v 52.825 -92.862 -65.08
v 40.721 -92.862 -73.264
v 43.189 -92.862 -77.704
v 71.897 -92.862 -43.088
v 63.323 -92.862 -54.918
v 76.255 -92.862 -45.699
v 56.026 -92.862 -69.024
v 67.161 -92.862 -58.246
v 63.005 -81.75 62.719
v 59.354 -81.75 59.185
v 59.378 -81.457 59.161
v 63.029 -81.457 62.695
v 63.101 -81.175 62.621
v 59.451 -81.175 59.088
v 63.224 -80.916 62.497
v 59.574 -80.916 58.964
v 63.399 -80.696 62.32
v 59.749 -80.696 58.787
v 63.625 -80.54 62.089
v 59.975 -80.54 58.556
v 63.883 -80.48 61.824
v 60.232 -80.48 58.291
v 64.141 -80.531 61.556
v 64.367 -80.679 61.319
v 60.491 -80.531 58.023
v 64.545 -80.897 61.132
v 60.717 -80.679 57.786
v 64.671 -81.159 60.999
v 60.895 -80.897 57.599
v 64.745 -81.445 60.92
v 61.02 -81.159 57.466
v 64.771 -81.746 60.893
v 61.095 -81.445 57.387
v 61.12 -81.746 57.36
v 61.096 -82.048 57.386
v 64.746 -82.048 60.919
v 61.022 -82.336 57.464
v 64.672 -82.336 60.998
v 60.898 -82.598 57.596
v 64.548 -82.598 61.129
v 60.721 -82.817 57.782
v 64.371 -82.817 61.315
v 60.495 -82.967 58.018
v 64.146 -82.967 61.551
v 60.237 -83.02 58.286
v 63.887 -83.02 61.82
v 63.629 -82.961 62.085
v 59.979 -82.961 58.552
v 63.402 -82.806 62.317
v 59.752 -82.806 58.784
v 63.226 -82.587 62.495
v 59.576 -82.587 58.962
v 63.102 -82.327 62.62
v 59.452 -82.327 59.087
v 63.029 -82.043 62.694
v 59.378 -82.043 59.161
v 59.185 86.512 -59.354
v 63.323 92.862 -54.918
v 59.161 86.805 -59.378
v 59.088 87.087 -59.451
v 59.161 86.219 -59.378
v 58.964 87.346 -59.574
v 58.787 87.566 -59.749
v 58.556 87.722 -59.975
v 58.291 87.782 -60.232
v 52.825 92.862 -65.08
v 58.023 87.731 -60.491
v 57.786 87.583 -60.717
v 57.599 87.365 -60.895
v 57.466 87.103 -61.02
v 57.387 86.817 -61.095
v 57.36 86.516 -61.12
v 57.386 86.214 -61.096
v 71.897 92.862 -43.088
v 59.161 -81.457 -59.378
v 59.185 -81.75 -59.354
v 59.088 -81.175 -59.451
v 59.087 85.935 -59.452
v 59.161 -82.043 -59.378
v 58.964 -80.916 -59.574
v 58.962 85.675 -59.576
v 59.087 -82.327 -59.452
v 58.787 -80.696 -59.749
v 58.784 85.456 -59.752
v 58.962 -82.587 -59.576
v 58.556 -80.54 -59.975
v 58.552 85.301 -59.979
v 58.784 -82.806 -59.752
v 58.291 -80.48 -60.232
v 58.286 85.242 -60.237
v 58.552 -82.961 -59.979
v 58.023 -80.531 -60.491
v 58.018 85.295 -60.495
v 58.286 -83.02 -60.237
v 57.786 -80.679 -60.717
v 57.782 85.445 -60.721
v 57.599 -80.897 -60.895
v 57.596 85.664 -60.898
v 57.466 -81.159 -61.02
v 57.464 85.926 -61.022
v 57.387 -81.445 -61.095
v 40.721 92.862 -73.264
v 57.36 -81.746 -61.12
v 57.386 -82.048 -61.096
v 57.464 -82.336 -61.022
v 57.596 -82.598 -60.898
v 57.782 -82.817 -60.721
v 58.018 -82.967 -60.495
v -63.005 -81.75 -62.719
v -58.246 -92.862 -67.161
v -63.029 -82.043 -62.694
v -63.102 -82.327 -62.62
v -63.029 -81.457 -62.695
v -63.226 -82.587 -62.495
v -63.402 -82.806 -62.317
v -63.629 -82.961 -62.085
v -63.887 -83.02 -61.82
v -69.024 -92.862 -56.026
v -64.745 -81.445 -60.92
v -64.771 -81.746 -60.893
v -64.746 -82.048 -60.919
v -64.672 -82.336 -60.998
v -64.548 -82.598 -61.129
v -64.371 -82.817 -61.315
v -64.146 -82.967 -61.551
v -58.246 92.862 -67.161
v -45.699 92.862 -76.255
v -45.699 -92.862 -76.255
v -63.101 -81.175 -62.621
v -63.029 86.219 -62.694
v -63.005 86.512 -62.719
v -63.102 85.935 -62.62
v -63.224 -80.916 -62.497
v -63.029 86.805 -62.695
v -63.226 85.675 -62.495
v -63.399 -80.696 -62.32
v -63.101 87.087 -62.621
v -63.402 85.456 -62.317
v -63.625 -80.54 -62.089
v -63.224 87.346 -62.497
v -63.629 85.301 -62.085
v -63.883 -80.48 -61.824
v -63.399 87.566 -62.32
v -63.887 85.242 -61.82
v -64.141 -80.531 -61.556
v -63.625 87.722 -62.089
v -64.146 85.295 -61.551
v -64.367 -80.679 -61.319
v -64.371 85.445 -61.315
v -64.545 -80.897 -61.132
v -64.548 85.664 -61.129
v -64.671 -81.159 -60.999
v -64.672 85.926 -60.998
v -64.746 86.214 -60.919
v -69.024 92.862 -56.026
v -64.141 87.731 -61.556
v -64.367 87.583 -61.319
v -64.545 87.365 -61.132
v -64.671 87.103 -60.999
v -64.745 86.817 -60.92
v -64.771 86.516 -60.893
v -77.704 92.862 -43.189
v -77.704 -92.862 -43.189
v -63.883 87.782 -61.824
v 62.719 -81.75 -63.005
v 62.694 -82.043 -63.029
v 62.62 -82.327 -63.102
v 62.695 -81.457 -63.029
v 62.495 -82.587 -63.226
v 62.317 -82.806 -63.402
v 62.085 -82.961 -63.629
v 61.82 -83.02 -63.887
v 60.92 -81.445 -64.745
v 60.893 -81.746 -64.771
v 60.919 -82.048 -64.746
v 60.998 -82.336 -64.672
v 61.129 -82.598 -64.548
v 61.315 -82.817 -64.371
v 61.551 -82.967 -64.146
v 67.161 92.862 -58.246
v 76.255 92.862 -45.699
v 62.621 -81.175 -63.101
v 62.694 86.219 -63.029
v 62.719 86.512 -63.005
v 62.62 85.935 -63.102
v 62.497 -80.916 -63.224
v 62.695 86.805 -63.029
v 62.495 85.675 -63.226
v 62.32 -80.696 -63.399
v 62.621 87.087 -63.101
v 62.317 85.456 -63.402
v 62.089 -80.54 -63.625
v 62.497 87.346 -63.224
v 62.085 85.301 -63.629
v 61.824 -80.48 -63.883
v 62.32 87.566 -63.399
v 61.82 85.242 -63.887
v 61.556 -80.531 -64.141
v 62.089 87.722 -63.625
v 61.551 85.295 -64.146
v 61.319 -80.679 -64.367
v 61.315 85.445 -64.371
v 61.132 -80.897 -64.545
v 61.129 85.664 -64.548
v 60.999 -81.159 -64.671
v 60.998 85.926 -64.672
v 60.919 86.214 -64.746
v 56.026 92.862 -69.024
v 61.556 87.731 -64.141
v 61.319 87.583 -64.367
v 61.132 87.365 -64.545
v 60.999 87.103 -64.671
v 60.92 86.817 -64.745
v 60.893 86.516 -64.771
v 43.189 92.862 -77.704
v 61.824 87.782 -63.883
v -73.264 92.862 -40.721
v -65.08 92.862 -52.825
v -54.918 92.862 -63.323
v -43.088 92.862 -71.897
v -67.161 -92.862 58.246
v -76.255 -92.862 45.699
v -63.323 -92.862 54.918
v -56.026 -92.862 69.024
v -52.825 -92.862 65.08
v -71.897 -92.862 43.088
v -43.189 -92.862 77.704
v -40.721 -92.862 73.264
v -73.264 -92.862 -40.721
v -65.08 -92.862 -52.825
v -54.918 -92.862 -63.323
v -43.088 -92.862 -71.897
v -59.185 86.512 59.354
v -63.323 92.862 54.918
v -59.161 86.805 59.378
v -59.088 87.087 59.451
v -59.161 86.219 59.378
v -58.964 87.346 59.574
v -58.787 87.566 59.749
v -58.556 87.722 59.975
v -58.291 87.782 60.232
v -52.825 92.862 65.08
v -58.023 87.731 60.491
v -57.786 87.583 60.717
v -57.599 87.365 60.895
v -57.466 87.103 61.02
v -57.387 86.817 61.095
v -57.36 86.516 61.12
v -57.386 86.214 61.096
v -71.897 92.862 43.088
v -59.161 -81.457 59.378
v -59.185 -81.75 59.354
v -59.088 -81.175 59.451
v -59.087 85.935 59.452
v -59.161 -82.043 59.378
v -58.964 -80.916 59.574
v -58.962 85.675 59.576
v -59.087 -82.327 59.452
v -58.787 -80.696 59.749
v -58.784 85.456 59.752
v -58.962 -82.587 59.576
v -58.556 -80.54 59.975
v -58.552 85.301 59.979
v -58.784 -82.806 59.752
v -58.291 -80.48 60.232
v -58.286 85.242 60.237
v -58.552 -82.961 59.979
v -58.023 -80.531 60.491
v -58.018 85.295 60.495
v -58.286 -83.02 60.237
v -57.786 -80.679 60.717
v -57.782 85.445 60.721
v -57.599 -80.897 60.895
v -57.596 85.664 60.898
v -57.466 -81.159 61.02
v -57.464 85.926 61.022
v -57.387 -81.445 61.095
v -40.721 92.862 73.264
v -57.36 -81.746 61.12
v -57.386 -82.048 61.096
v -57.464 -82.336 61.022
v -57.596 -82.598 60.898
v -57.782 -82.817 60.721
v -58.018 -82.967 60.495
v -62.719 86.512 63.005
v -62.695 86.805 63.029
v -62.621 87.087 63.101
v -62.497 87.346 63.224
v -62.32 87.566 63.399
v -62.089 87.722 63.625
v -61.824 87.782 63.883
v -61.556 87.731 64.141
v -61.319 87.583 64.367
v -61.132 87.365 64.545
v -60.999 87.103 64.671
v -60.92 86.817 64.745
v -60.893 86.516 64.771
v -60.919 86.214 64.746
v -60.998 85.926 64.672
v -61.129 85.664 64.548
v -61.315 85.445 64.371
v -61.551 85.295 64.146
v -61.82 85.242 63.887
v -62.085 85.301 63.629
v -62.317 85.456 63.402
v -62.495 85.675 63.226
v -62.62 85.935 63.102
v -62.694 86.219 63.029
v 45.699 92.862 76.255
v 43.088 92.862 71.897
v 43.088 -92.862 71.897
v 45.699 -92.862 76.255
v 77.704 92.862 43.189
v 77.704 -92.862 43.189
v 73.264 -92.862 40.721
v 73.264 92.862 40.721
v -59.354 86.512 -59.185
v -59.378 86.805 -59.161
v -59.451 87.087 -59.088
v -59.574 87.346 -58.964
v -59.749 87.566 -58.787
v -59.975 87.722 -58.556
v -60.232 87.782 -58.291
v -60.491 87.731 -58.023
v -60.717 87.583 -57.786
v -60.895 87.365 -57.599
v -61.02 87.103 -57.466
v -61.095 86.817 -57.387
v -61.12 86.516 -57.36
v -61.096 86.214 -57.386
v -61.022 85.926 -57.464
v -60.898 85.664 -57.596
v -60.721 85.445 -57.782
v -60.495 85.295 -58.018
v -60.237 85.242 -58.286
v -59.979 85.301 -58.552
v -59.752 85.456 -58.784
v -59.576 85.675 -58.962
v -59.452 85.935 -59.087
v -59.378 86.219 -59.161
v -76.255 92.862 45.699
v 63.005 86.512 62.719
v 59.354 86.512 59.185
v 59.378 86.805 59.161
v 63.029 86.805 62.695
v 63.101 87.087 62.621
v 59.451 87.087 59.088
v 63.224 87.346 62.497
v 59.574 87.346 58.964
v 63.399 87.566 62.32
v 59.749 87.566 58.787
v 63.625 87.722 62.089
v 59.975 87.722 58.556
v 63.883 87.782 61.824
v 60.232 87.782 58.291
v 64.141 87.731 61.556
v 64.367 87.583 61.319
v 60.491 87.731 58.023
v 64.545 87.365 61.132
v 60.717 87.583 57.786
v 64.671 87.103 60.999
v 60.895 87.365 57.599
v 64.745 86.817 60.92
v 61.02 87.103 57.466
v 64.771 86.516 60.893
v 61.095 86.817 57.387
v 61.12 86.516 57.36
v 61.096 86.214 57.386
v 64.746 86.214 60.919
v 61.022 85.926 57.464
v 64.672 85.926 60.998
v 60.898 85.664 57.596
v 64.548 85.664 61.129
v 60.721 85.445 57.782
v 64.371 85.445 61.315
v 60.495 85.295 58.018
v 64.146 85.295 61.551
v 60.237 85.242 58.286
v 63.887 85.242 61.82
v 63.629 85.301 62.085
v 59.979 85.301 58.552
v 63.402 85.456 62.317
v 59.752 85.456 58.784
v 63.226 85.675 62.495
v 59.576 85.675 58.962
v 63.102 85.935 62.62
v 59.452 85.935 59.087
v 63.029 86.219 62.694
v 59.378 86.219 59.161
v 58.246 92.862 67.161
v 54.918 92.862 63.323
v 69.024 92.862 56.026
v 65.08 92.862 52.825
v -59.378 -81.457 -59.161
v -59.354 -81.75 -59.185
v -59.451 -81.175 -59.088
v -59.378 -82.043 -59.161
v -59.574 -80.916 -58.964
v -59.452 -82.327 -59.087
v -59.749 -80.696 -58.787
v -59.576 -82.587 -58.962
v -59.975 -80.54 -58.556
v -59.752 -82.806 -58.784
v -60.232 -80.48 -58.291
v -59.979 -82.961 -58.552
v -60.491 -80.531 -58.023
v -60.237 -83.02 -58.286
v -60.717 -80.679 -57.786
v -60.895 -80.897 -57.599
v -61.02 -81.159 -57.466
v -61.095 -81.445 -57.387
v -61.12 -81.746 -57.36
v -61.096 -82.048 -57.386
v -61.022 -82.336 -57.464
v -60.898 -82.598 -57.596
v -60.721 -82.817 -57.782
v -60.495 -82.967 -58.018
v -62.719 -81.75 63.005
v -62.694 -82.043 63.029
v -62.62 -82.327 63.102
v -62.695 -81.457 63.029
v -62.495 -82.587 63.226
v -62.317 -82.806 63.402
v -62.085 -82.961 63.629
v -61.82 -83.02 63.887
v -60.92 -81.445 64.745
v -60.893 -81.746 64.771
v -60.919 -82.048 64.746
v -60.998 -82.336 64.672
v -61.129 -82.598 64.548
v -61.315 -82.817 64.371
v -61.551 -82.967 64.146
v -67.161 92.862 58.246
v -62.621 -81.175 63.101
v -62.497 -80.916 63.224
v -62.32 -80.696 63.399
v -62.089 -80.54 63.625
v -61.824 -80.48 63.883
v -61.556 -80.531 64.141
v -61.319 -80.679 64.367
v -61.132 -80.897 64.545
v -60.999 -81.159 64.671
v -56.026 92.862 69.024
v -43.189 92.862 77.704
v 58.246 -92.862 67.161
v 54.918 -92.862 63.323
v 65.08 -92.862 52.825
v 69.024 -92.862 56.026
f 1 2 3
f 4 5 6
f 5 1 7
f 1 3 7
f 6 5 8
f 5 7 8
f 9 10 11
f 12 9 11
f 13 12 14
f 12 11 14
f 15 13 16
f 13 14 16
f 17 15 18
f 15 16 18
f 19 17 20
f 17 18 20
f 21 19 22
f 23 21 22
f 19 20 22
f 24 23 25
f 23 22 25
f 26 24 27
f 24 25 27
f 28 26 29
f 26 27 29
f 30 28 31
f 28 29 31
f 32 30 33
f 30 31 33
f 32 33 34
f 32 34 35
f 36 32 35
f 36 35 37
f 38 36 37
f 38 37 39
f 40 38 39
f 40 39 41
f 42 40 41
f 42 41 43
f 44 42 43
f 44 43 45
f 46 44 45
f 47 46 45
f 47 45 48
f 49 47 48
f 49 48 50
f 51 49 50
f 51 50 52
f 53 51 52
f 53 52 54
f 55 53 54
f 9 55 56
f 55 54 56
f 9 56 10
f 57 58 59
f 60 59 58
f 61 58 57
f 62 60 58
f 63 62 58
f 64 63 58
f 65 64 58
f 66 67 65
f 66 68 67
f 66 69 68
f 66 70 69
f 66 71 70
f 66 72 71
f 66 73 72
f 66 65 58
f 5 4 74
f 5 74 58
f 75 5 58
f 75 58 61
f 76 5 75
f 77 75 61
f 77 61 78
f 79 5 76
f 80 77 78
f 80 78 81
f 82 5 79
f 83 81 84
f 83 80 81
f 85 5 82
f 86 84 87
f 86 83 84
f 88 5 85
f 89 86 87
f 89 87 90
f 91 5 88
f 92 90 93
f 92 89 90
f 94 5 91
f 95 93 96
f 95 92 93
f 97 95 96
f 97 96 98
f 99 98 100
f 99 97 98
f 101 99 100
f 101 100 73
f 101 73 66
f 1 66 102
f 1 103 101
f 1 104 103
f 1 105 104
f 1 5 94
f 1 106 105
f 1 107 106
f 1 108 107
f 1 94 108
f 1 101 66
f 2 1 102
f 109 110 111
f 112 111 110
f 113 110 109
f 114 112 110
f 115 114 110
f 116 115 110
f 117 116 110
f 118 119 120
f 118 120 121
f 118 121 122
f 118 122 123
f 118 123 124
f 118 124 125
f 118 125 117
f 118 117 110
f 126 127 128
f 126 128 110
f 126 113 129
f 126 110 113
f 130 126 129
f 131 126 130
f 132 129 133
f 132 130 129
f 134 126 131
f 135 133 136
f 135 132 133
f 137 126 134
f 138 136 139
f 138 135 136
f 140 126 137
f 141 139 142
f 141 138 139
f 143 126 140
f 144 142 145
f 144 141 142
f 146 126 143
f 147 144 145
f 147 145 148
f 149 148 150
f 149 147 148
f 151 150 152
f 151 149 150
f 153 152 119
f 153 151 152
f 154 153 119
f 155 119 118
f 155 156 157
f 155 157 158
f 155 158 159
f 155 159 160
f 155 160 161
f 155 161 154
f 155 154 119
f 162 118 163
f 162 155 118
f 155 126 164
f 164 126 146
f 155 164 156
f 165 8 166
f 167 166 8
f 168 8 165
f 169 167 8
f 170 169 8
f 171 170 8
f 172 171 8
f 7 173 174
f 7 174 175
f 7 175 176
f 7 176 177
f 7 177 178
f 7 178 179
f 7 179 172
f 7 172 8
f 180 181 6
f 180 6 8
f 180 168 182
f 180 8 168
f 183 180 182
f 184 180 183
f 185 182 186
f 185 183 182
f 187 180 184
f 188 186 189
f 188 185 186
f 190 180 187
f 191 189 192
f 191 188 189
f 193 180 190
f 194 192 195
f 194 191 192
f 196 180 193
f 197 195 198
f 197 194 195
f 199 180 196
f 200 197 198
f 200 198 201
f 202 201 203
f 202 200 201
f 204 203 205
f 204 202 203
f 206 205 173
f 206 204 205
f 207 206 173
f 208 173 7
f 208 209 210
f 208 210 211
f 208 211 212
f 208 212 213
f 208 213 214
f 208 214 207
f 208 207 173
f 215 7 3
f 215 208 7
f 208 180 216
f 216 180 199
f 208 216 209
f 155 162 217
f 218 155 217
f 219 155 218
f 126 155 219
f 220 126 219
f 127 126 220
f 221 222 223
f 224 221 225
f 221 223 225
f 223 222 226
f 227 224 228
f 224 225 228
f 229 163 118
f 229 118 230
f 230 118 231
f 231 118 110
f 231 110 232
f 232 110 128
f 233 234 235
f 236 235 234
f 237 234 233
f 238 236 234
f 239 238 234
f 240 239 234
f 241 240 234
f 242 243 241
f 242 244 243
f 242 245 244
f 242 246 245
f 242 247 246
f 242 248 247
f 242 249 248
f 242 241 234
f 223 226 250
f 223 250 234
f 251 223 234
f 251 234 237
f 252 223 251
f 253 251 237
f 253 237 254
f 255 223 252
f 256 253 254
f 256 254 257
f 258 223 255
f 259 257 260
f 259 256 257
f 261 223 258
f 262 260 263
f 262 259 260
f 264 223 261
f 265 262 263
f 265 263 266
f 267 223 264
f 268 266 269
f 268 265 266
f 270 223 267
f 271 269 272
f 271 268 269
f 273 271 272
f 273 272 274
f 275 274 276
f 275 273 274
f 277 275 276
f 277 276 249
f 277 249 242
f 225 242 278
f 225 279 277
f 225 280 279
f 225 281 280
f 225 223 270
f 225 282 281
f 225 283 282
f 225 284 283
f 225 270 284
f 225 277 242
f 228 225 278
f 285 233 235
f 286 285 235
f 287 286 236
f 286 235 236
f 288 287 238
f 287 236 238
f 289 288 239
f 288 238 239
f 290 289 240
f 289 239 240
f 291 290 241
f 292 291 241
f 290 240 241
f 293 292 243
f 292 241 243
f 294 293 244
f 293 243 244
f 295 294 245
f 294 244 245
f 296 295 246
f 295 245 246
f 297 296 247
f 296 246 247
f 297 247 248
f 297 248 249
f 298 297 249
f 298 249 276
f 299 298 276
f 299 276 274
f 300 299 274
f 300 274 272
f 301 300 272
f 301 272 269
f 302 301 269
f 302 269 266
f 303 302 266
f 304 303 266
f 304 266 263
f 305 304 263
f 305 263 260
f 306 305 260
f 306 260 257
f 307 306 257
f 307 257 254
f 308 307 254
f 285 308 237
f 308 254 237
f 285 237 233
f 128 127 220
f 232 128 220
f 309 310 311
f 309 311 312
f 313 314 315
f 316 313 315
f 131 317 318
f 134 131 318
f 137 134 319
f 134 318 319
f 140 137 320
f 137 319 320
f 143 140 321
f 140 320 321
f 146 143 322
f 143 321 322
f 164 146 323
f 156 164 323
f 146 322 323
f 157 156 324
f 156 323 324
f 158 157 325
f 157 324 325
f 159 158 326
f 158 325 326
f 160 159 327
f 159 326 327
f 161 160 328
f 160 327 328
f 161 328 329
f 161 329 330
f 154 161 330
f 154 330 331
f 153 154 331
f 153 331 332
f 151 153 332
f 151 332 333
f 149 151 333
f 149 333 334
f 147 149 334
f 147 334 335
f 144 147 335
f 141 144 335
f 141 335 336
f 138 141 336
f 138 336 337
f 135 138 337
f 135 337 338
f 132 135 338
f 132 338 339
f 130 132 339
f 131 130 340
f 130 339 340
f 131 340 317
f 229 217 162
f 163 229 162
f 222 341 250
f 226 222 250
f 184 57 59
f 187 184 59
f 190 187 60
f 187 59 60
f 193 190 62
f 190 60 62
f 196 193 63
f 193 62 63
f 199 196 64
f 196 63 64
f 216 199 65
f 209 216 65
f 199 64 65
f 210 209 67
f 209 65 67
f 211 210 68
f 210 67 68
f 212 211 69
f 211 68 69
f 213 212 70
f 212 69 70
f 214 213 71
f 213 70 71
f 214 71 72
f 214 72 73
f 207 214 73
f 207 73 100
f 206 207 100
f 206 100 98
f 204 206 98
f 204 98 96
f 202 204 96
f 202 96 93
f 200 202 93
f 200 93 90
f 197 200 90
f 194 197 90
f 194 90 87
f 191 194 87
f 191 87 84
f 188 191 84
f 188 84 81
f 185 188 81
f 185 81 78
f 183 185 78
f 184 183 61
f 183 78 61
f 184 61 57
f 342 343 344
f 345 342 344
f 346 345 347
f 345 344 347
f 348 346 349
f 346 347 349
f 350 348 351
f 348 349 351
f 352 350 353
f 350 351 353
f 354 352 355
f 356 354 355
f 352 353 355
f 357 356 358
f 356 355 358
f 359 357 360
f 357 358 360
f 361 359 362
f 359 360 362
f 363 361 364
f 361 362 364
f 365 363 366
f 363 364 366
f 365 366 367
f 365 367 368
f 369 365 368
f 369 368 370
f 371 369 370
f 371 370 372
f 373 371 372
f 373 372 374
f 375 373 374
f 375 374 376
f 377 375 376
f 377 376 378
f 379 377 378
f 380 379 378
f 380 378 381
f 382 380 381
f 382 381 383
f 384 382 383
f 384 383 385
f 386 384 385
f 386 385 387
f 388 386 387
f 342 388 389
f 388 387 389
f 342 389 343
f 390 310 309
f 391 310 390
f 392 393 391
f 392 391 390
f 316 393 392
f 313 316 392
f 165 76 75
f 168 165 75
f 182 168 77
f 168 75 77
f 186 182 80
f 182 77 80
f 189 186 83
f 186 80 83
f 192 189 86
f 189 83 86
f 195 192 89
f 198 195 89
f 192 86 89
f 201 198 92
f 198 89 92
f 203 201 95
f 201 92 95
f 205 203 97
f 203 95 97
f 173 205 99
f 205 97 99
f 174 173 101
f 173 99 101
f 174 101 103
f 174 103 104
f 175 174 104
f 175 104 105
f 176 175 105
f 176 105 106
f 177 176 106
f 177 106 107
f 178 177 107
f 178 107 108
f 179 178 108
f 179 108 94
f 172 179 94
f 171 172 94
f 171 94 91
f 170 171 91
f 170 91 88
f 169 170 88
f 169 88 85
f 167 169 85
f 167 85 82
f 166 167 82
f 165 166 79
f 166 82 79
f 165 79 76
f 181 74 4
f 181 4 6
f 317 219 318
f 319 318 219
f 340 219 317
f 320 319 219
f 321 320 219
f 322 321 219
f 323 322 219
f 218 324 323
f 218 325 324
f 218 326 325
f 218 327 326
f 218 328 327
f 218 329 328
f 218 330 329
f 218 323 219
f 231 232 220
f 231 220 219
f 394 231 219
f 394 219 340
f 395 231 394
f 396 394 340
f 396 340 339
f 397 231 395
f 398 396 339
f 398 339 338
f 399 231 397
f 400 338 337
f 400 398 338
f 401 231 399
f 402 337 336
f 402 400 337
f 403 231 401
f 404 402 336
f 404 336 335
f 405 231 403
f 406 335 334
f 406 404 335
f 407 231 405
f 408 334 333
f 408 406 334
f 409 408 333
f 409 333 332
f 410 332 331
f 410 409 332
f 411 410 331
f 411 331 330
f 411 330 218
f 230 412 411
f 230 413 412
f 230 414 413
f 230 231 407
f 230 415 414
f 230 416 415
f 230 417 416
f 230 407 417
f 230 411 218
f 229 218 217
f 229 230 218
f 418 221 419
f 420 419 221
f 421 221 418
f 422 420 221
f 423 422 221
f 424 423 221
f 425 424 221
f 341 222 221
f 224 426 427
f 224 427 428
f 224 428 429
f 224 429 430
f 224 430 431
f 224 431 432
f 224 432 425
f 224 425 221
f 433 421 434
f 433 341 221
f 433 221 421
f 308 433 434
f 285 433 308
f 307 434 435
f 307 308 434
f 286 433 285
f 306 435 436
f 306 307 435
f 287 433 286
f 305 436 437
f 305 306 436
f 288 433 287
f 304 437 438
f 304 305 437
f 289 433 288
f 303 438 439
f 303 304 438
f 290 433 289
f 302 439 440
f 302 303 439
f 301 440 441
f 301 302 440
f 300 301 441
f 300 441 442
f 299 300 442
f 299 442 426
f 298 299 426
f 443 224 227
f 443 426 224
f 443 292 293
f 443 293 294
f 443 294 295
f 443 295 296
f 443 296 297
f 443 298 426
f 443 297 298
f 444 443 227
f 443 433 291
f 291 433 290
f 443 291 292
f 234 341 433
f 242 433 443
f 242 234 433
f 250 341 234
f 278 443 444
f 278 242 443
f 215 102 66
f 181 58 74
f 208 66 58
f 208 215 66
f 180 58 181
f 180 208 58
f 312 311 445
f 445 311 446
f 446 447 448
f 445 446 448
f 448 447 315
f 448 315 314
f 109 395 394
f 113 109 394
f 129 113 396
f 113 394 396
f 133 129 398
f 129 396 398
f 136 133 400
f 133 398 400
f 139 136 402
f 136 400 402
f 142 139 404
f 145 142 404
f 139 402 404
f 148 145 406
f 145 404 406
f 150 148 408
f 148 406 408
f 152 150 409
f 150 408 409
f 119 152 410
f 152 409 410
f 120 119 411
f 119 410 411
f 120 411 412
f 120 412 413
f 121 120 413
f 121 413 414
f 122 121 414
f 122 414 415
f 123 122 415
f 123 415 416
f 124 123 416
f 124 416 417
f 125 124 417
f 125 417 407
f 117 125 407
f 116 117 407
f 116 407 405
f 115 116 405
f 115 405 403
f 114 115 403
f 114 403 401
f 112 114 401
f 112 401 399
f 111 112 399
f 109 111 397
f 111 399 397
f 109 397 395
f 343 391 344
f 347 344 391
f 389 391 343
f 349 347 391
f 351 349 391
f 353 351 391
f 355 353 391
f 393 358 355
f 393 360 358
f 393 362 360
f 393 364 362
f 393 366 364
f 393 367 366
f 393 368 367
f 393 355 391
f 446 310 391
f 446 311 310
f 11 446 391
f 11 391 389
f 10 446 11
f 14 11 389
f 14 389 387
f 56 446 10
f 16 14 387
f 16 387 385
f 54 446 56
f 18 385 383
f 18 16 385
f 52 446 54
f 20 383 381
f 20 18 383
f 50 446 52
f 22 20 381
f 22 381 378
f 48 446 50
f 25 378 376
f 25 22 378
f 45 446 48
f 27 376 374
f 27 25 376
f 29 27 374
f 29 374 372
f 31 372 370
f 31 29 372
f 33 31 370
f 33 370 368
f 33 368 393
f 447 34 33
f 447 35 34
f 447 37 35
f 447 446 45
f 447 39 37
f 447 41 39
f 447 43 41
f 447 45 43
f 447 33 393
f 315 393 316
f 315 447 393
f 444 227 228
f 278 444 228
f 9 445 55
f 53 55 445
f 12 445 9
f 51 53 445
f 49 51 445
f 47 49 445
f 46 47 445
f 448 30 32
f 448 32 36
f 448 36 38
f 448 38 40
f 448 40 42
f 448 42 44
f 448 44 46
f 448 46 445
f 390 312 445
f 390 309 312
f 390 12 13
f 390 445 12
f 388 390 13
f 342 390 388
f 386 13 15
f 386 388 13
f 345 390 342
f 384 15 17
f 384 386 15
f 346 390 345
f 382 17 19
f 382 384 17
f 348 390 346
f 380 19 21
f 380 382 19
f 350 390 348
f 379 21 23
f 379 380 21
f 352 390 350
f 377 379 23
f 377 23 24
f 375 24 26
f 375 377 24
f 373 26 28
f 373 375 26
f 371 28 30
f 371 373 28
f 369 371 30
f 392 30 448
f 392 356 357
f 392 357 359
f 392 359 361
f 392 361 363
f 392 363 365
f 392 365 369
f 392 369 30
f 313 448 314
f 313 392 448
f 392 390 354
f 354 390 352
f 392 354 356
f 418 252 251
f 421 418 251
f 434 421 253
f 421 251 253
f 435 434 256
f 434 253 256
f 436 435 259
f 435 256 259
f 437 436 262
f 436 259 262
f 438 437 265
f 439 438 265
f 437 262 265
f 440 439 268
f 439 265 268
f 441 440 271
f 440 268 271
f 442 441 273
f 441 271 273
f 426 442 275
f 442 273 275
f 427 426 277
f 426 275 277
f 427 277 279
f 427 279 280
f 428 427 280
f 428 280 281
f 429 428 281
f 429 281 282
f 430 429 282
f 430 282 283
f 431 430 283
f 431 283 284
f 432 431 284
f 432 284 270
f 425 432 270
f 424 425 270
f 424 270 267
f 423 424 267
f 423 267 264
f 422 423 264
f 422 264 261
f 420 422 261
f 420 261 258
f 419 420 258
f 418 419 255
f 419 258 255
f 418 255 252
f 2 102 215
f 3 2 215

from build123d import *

# Parameters (mm, degrees)
SKETCH2_R               = 88.9
SKETCH2_R_2             = 83.82
BOSS_EXTRUDE1_DEPTH     = 92.862273
CUT_EXTRUDE1_DEPTH      = 93.862273
CUT_EXTRUDE1_DEPTH_BACK = 93.862273
SKETCH5_R               = 1.27
BOLT_HOLES_DEPTH        = 29.911624556
BOLT_PATTERN_COUNT      = 4


with BuildPart() as part:
    # Sketch2 → Boss-Extrude1 (new body, symmetric)
    with BuildSketch(Plane(origin=(0, 0, 0), x_dir=(1, 0, 0), z_dir=(0, 1, 0))):
        Circle(SKETCH2_R)
        Circle(SKETCH2_R_2, mode=Mode.SUBTRACT)
    extrude(amount=BOSS_EXTRUDE1_DEPTH, both=True)

    # Sketch3 → Cut-Extrude1 (cut, two sides)
    with BuildSketch(Plane(origin=(0, 0, 0), x_dir=(1, 0, 0), z_dir=(0, 1, 0))) as cut_extrude1_sk:
        Polygon((169.661755759, -94.300371224), (0, 0), (169.661755759, 101.677593364), align=None)
        Polygon((0, 0), (53.900027233, 96.974944394), (-58.116685864, 96.974944394), align=None)
        Polygon((-123.741299607, 68.777140945), (-123.741299607, -74.157652604), (0, 0), align=None)
        Polygon((-65.840936026, -118.45858783), (0, 0), (70.991745134, -118.45858783), align=None)
    extrude(amount=CUT_EXTRUDE1_DEPTH, mode=Mode.SUBTRACT)
    extrude(cut_extrude1_sk.sketch, amount=-CUT_EXTRUDE1_DEPTH_BACK, mode=Mode.SUBTRACT)

    # Sketch5 → Bolt holes (cut, through all)
    with BuildSketch(Plane(origin=(-56.309218645, 0, 58.175814955), x_dir=(-0.718540152, 0, -0.695485478), z_dir=(0.695485478, 0, -0.718540152))):
        with Locations((-0.02278764, 86.512273)):
            Circle(SKETCH5_R)
        with Locations((-0.02278764, -81.749773)):
            Circle(SKETCH5_R)
    bolt_holes = extrude(amount=-BOLT_HOLES_DEPTH, mode=Mode.SUBTRACT)

    # Bolt pattern: Bolt holes ×4 about axis
    bolt_pattern_axis = Axis((0, 92.862273, 0), (0, 1, 0))
    for i in range(1, BOLT_PATTERN_COUNT):
        add(bolt_holes.rotate(bolt_pattern_axis, i * 360 / BOLT_PATTERN_COUNT), mode=Mode.SUBTRACT)


solid = part.part
